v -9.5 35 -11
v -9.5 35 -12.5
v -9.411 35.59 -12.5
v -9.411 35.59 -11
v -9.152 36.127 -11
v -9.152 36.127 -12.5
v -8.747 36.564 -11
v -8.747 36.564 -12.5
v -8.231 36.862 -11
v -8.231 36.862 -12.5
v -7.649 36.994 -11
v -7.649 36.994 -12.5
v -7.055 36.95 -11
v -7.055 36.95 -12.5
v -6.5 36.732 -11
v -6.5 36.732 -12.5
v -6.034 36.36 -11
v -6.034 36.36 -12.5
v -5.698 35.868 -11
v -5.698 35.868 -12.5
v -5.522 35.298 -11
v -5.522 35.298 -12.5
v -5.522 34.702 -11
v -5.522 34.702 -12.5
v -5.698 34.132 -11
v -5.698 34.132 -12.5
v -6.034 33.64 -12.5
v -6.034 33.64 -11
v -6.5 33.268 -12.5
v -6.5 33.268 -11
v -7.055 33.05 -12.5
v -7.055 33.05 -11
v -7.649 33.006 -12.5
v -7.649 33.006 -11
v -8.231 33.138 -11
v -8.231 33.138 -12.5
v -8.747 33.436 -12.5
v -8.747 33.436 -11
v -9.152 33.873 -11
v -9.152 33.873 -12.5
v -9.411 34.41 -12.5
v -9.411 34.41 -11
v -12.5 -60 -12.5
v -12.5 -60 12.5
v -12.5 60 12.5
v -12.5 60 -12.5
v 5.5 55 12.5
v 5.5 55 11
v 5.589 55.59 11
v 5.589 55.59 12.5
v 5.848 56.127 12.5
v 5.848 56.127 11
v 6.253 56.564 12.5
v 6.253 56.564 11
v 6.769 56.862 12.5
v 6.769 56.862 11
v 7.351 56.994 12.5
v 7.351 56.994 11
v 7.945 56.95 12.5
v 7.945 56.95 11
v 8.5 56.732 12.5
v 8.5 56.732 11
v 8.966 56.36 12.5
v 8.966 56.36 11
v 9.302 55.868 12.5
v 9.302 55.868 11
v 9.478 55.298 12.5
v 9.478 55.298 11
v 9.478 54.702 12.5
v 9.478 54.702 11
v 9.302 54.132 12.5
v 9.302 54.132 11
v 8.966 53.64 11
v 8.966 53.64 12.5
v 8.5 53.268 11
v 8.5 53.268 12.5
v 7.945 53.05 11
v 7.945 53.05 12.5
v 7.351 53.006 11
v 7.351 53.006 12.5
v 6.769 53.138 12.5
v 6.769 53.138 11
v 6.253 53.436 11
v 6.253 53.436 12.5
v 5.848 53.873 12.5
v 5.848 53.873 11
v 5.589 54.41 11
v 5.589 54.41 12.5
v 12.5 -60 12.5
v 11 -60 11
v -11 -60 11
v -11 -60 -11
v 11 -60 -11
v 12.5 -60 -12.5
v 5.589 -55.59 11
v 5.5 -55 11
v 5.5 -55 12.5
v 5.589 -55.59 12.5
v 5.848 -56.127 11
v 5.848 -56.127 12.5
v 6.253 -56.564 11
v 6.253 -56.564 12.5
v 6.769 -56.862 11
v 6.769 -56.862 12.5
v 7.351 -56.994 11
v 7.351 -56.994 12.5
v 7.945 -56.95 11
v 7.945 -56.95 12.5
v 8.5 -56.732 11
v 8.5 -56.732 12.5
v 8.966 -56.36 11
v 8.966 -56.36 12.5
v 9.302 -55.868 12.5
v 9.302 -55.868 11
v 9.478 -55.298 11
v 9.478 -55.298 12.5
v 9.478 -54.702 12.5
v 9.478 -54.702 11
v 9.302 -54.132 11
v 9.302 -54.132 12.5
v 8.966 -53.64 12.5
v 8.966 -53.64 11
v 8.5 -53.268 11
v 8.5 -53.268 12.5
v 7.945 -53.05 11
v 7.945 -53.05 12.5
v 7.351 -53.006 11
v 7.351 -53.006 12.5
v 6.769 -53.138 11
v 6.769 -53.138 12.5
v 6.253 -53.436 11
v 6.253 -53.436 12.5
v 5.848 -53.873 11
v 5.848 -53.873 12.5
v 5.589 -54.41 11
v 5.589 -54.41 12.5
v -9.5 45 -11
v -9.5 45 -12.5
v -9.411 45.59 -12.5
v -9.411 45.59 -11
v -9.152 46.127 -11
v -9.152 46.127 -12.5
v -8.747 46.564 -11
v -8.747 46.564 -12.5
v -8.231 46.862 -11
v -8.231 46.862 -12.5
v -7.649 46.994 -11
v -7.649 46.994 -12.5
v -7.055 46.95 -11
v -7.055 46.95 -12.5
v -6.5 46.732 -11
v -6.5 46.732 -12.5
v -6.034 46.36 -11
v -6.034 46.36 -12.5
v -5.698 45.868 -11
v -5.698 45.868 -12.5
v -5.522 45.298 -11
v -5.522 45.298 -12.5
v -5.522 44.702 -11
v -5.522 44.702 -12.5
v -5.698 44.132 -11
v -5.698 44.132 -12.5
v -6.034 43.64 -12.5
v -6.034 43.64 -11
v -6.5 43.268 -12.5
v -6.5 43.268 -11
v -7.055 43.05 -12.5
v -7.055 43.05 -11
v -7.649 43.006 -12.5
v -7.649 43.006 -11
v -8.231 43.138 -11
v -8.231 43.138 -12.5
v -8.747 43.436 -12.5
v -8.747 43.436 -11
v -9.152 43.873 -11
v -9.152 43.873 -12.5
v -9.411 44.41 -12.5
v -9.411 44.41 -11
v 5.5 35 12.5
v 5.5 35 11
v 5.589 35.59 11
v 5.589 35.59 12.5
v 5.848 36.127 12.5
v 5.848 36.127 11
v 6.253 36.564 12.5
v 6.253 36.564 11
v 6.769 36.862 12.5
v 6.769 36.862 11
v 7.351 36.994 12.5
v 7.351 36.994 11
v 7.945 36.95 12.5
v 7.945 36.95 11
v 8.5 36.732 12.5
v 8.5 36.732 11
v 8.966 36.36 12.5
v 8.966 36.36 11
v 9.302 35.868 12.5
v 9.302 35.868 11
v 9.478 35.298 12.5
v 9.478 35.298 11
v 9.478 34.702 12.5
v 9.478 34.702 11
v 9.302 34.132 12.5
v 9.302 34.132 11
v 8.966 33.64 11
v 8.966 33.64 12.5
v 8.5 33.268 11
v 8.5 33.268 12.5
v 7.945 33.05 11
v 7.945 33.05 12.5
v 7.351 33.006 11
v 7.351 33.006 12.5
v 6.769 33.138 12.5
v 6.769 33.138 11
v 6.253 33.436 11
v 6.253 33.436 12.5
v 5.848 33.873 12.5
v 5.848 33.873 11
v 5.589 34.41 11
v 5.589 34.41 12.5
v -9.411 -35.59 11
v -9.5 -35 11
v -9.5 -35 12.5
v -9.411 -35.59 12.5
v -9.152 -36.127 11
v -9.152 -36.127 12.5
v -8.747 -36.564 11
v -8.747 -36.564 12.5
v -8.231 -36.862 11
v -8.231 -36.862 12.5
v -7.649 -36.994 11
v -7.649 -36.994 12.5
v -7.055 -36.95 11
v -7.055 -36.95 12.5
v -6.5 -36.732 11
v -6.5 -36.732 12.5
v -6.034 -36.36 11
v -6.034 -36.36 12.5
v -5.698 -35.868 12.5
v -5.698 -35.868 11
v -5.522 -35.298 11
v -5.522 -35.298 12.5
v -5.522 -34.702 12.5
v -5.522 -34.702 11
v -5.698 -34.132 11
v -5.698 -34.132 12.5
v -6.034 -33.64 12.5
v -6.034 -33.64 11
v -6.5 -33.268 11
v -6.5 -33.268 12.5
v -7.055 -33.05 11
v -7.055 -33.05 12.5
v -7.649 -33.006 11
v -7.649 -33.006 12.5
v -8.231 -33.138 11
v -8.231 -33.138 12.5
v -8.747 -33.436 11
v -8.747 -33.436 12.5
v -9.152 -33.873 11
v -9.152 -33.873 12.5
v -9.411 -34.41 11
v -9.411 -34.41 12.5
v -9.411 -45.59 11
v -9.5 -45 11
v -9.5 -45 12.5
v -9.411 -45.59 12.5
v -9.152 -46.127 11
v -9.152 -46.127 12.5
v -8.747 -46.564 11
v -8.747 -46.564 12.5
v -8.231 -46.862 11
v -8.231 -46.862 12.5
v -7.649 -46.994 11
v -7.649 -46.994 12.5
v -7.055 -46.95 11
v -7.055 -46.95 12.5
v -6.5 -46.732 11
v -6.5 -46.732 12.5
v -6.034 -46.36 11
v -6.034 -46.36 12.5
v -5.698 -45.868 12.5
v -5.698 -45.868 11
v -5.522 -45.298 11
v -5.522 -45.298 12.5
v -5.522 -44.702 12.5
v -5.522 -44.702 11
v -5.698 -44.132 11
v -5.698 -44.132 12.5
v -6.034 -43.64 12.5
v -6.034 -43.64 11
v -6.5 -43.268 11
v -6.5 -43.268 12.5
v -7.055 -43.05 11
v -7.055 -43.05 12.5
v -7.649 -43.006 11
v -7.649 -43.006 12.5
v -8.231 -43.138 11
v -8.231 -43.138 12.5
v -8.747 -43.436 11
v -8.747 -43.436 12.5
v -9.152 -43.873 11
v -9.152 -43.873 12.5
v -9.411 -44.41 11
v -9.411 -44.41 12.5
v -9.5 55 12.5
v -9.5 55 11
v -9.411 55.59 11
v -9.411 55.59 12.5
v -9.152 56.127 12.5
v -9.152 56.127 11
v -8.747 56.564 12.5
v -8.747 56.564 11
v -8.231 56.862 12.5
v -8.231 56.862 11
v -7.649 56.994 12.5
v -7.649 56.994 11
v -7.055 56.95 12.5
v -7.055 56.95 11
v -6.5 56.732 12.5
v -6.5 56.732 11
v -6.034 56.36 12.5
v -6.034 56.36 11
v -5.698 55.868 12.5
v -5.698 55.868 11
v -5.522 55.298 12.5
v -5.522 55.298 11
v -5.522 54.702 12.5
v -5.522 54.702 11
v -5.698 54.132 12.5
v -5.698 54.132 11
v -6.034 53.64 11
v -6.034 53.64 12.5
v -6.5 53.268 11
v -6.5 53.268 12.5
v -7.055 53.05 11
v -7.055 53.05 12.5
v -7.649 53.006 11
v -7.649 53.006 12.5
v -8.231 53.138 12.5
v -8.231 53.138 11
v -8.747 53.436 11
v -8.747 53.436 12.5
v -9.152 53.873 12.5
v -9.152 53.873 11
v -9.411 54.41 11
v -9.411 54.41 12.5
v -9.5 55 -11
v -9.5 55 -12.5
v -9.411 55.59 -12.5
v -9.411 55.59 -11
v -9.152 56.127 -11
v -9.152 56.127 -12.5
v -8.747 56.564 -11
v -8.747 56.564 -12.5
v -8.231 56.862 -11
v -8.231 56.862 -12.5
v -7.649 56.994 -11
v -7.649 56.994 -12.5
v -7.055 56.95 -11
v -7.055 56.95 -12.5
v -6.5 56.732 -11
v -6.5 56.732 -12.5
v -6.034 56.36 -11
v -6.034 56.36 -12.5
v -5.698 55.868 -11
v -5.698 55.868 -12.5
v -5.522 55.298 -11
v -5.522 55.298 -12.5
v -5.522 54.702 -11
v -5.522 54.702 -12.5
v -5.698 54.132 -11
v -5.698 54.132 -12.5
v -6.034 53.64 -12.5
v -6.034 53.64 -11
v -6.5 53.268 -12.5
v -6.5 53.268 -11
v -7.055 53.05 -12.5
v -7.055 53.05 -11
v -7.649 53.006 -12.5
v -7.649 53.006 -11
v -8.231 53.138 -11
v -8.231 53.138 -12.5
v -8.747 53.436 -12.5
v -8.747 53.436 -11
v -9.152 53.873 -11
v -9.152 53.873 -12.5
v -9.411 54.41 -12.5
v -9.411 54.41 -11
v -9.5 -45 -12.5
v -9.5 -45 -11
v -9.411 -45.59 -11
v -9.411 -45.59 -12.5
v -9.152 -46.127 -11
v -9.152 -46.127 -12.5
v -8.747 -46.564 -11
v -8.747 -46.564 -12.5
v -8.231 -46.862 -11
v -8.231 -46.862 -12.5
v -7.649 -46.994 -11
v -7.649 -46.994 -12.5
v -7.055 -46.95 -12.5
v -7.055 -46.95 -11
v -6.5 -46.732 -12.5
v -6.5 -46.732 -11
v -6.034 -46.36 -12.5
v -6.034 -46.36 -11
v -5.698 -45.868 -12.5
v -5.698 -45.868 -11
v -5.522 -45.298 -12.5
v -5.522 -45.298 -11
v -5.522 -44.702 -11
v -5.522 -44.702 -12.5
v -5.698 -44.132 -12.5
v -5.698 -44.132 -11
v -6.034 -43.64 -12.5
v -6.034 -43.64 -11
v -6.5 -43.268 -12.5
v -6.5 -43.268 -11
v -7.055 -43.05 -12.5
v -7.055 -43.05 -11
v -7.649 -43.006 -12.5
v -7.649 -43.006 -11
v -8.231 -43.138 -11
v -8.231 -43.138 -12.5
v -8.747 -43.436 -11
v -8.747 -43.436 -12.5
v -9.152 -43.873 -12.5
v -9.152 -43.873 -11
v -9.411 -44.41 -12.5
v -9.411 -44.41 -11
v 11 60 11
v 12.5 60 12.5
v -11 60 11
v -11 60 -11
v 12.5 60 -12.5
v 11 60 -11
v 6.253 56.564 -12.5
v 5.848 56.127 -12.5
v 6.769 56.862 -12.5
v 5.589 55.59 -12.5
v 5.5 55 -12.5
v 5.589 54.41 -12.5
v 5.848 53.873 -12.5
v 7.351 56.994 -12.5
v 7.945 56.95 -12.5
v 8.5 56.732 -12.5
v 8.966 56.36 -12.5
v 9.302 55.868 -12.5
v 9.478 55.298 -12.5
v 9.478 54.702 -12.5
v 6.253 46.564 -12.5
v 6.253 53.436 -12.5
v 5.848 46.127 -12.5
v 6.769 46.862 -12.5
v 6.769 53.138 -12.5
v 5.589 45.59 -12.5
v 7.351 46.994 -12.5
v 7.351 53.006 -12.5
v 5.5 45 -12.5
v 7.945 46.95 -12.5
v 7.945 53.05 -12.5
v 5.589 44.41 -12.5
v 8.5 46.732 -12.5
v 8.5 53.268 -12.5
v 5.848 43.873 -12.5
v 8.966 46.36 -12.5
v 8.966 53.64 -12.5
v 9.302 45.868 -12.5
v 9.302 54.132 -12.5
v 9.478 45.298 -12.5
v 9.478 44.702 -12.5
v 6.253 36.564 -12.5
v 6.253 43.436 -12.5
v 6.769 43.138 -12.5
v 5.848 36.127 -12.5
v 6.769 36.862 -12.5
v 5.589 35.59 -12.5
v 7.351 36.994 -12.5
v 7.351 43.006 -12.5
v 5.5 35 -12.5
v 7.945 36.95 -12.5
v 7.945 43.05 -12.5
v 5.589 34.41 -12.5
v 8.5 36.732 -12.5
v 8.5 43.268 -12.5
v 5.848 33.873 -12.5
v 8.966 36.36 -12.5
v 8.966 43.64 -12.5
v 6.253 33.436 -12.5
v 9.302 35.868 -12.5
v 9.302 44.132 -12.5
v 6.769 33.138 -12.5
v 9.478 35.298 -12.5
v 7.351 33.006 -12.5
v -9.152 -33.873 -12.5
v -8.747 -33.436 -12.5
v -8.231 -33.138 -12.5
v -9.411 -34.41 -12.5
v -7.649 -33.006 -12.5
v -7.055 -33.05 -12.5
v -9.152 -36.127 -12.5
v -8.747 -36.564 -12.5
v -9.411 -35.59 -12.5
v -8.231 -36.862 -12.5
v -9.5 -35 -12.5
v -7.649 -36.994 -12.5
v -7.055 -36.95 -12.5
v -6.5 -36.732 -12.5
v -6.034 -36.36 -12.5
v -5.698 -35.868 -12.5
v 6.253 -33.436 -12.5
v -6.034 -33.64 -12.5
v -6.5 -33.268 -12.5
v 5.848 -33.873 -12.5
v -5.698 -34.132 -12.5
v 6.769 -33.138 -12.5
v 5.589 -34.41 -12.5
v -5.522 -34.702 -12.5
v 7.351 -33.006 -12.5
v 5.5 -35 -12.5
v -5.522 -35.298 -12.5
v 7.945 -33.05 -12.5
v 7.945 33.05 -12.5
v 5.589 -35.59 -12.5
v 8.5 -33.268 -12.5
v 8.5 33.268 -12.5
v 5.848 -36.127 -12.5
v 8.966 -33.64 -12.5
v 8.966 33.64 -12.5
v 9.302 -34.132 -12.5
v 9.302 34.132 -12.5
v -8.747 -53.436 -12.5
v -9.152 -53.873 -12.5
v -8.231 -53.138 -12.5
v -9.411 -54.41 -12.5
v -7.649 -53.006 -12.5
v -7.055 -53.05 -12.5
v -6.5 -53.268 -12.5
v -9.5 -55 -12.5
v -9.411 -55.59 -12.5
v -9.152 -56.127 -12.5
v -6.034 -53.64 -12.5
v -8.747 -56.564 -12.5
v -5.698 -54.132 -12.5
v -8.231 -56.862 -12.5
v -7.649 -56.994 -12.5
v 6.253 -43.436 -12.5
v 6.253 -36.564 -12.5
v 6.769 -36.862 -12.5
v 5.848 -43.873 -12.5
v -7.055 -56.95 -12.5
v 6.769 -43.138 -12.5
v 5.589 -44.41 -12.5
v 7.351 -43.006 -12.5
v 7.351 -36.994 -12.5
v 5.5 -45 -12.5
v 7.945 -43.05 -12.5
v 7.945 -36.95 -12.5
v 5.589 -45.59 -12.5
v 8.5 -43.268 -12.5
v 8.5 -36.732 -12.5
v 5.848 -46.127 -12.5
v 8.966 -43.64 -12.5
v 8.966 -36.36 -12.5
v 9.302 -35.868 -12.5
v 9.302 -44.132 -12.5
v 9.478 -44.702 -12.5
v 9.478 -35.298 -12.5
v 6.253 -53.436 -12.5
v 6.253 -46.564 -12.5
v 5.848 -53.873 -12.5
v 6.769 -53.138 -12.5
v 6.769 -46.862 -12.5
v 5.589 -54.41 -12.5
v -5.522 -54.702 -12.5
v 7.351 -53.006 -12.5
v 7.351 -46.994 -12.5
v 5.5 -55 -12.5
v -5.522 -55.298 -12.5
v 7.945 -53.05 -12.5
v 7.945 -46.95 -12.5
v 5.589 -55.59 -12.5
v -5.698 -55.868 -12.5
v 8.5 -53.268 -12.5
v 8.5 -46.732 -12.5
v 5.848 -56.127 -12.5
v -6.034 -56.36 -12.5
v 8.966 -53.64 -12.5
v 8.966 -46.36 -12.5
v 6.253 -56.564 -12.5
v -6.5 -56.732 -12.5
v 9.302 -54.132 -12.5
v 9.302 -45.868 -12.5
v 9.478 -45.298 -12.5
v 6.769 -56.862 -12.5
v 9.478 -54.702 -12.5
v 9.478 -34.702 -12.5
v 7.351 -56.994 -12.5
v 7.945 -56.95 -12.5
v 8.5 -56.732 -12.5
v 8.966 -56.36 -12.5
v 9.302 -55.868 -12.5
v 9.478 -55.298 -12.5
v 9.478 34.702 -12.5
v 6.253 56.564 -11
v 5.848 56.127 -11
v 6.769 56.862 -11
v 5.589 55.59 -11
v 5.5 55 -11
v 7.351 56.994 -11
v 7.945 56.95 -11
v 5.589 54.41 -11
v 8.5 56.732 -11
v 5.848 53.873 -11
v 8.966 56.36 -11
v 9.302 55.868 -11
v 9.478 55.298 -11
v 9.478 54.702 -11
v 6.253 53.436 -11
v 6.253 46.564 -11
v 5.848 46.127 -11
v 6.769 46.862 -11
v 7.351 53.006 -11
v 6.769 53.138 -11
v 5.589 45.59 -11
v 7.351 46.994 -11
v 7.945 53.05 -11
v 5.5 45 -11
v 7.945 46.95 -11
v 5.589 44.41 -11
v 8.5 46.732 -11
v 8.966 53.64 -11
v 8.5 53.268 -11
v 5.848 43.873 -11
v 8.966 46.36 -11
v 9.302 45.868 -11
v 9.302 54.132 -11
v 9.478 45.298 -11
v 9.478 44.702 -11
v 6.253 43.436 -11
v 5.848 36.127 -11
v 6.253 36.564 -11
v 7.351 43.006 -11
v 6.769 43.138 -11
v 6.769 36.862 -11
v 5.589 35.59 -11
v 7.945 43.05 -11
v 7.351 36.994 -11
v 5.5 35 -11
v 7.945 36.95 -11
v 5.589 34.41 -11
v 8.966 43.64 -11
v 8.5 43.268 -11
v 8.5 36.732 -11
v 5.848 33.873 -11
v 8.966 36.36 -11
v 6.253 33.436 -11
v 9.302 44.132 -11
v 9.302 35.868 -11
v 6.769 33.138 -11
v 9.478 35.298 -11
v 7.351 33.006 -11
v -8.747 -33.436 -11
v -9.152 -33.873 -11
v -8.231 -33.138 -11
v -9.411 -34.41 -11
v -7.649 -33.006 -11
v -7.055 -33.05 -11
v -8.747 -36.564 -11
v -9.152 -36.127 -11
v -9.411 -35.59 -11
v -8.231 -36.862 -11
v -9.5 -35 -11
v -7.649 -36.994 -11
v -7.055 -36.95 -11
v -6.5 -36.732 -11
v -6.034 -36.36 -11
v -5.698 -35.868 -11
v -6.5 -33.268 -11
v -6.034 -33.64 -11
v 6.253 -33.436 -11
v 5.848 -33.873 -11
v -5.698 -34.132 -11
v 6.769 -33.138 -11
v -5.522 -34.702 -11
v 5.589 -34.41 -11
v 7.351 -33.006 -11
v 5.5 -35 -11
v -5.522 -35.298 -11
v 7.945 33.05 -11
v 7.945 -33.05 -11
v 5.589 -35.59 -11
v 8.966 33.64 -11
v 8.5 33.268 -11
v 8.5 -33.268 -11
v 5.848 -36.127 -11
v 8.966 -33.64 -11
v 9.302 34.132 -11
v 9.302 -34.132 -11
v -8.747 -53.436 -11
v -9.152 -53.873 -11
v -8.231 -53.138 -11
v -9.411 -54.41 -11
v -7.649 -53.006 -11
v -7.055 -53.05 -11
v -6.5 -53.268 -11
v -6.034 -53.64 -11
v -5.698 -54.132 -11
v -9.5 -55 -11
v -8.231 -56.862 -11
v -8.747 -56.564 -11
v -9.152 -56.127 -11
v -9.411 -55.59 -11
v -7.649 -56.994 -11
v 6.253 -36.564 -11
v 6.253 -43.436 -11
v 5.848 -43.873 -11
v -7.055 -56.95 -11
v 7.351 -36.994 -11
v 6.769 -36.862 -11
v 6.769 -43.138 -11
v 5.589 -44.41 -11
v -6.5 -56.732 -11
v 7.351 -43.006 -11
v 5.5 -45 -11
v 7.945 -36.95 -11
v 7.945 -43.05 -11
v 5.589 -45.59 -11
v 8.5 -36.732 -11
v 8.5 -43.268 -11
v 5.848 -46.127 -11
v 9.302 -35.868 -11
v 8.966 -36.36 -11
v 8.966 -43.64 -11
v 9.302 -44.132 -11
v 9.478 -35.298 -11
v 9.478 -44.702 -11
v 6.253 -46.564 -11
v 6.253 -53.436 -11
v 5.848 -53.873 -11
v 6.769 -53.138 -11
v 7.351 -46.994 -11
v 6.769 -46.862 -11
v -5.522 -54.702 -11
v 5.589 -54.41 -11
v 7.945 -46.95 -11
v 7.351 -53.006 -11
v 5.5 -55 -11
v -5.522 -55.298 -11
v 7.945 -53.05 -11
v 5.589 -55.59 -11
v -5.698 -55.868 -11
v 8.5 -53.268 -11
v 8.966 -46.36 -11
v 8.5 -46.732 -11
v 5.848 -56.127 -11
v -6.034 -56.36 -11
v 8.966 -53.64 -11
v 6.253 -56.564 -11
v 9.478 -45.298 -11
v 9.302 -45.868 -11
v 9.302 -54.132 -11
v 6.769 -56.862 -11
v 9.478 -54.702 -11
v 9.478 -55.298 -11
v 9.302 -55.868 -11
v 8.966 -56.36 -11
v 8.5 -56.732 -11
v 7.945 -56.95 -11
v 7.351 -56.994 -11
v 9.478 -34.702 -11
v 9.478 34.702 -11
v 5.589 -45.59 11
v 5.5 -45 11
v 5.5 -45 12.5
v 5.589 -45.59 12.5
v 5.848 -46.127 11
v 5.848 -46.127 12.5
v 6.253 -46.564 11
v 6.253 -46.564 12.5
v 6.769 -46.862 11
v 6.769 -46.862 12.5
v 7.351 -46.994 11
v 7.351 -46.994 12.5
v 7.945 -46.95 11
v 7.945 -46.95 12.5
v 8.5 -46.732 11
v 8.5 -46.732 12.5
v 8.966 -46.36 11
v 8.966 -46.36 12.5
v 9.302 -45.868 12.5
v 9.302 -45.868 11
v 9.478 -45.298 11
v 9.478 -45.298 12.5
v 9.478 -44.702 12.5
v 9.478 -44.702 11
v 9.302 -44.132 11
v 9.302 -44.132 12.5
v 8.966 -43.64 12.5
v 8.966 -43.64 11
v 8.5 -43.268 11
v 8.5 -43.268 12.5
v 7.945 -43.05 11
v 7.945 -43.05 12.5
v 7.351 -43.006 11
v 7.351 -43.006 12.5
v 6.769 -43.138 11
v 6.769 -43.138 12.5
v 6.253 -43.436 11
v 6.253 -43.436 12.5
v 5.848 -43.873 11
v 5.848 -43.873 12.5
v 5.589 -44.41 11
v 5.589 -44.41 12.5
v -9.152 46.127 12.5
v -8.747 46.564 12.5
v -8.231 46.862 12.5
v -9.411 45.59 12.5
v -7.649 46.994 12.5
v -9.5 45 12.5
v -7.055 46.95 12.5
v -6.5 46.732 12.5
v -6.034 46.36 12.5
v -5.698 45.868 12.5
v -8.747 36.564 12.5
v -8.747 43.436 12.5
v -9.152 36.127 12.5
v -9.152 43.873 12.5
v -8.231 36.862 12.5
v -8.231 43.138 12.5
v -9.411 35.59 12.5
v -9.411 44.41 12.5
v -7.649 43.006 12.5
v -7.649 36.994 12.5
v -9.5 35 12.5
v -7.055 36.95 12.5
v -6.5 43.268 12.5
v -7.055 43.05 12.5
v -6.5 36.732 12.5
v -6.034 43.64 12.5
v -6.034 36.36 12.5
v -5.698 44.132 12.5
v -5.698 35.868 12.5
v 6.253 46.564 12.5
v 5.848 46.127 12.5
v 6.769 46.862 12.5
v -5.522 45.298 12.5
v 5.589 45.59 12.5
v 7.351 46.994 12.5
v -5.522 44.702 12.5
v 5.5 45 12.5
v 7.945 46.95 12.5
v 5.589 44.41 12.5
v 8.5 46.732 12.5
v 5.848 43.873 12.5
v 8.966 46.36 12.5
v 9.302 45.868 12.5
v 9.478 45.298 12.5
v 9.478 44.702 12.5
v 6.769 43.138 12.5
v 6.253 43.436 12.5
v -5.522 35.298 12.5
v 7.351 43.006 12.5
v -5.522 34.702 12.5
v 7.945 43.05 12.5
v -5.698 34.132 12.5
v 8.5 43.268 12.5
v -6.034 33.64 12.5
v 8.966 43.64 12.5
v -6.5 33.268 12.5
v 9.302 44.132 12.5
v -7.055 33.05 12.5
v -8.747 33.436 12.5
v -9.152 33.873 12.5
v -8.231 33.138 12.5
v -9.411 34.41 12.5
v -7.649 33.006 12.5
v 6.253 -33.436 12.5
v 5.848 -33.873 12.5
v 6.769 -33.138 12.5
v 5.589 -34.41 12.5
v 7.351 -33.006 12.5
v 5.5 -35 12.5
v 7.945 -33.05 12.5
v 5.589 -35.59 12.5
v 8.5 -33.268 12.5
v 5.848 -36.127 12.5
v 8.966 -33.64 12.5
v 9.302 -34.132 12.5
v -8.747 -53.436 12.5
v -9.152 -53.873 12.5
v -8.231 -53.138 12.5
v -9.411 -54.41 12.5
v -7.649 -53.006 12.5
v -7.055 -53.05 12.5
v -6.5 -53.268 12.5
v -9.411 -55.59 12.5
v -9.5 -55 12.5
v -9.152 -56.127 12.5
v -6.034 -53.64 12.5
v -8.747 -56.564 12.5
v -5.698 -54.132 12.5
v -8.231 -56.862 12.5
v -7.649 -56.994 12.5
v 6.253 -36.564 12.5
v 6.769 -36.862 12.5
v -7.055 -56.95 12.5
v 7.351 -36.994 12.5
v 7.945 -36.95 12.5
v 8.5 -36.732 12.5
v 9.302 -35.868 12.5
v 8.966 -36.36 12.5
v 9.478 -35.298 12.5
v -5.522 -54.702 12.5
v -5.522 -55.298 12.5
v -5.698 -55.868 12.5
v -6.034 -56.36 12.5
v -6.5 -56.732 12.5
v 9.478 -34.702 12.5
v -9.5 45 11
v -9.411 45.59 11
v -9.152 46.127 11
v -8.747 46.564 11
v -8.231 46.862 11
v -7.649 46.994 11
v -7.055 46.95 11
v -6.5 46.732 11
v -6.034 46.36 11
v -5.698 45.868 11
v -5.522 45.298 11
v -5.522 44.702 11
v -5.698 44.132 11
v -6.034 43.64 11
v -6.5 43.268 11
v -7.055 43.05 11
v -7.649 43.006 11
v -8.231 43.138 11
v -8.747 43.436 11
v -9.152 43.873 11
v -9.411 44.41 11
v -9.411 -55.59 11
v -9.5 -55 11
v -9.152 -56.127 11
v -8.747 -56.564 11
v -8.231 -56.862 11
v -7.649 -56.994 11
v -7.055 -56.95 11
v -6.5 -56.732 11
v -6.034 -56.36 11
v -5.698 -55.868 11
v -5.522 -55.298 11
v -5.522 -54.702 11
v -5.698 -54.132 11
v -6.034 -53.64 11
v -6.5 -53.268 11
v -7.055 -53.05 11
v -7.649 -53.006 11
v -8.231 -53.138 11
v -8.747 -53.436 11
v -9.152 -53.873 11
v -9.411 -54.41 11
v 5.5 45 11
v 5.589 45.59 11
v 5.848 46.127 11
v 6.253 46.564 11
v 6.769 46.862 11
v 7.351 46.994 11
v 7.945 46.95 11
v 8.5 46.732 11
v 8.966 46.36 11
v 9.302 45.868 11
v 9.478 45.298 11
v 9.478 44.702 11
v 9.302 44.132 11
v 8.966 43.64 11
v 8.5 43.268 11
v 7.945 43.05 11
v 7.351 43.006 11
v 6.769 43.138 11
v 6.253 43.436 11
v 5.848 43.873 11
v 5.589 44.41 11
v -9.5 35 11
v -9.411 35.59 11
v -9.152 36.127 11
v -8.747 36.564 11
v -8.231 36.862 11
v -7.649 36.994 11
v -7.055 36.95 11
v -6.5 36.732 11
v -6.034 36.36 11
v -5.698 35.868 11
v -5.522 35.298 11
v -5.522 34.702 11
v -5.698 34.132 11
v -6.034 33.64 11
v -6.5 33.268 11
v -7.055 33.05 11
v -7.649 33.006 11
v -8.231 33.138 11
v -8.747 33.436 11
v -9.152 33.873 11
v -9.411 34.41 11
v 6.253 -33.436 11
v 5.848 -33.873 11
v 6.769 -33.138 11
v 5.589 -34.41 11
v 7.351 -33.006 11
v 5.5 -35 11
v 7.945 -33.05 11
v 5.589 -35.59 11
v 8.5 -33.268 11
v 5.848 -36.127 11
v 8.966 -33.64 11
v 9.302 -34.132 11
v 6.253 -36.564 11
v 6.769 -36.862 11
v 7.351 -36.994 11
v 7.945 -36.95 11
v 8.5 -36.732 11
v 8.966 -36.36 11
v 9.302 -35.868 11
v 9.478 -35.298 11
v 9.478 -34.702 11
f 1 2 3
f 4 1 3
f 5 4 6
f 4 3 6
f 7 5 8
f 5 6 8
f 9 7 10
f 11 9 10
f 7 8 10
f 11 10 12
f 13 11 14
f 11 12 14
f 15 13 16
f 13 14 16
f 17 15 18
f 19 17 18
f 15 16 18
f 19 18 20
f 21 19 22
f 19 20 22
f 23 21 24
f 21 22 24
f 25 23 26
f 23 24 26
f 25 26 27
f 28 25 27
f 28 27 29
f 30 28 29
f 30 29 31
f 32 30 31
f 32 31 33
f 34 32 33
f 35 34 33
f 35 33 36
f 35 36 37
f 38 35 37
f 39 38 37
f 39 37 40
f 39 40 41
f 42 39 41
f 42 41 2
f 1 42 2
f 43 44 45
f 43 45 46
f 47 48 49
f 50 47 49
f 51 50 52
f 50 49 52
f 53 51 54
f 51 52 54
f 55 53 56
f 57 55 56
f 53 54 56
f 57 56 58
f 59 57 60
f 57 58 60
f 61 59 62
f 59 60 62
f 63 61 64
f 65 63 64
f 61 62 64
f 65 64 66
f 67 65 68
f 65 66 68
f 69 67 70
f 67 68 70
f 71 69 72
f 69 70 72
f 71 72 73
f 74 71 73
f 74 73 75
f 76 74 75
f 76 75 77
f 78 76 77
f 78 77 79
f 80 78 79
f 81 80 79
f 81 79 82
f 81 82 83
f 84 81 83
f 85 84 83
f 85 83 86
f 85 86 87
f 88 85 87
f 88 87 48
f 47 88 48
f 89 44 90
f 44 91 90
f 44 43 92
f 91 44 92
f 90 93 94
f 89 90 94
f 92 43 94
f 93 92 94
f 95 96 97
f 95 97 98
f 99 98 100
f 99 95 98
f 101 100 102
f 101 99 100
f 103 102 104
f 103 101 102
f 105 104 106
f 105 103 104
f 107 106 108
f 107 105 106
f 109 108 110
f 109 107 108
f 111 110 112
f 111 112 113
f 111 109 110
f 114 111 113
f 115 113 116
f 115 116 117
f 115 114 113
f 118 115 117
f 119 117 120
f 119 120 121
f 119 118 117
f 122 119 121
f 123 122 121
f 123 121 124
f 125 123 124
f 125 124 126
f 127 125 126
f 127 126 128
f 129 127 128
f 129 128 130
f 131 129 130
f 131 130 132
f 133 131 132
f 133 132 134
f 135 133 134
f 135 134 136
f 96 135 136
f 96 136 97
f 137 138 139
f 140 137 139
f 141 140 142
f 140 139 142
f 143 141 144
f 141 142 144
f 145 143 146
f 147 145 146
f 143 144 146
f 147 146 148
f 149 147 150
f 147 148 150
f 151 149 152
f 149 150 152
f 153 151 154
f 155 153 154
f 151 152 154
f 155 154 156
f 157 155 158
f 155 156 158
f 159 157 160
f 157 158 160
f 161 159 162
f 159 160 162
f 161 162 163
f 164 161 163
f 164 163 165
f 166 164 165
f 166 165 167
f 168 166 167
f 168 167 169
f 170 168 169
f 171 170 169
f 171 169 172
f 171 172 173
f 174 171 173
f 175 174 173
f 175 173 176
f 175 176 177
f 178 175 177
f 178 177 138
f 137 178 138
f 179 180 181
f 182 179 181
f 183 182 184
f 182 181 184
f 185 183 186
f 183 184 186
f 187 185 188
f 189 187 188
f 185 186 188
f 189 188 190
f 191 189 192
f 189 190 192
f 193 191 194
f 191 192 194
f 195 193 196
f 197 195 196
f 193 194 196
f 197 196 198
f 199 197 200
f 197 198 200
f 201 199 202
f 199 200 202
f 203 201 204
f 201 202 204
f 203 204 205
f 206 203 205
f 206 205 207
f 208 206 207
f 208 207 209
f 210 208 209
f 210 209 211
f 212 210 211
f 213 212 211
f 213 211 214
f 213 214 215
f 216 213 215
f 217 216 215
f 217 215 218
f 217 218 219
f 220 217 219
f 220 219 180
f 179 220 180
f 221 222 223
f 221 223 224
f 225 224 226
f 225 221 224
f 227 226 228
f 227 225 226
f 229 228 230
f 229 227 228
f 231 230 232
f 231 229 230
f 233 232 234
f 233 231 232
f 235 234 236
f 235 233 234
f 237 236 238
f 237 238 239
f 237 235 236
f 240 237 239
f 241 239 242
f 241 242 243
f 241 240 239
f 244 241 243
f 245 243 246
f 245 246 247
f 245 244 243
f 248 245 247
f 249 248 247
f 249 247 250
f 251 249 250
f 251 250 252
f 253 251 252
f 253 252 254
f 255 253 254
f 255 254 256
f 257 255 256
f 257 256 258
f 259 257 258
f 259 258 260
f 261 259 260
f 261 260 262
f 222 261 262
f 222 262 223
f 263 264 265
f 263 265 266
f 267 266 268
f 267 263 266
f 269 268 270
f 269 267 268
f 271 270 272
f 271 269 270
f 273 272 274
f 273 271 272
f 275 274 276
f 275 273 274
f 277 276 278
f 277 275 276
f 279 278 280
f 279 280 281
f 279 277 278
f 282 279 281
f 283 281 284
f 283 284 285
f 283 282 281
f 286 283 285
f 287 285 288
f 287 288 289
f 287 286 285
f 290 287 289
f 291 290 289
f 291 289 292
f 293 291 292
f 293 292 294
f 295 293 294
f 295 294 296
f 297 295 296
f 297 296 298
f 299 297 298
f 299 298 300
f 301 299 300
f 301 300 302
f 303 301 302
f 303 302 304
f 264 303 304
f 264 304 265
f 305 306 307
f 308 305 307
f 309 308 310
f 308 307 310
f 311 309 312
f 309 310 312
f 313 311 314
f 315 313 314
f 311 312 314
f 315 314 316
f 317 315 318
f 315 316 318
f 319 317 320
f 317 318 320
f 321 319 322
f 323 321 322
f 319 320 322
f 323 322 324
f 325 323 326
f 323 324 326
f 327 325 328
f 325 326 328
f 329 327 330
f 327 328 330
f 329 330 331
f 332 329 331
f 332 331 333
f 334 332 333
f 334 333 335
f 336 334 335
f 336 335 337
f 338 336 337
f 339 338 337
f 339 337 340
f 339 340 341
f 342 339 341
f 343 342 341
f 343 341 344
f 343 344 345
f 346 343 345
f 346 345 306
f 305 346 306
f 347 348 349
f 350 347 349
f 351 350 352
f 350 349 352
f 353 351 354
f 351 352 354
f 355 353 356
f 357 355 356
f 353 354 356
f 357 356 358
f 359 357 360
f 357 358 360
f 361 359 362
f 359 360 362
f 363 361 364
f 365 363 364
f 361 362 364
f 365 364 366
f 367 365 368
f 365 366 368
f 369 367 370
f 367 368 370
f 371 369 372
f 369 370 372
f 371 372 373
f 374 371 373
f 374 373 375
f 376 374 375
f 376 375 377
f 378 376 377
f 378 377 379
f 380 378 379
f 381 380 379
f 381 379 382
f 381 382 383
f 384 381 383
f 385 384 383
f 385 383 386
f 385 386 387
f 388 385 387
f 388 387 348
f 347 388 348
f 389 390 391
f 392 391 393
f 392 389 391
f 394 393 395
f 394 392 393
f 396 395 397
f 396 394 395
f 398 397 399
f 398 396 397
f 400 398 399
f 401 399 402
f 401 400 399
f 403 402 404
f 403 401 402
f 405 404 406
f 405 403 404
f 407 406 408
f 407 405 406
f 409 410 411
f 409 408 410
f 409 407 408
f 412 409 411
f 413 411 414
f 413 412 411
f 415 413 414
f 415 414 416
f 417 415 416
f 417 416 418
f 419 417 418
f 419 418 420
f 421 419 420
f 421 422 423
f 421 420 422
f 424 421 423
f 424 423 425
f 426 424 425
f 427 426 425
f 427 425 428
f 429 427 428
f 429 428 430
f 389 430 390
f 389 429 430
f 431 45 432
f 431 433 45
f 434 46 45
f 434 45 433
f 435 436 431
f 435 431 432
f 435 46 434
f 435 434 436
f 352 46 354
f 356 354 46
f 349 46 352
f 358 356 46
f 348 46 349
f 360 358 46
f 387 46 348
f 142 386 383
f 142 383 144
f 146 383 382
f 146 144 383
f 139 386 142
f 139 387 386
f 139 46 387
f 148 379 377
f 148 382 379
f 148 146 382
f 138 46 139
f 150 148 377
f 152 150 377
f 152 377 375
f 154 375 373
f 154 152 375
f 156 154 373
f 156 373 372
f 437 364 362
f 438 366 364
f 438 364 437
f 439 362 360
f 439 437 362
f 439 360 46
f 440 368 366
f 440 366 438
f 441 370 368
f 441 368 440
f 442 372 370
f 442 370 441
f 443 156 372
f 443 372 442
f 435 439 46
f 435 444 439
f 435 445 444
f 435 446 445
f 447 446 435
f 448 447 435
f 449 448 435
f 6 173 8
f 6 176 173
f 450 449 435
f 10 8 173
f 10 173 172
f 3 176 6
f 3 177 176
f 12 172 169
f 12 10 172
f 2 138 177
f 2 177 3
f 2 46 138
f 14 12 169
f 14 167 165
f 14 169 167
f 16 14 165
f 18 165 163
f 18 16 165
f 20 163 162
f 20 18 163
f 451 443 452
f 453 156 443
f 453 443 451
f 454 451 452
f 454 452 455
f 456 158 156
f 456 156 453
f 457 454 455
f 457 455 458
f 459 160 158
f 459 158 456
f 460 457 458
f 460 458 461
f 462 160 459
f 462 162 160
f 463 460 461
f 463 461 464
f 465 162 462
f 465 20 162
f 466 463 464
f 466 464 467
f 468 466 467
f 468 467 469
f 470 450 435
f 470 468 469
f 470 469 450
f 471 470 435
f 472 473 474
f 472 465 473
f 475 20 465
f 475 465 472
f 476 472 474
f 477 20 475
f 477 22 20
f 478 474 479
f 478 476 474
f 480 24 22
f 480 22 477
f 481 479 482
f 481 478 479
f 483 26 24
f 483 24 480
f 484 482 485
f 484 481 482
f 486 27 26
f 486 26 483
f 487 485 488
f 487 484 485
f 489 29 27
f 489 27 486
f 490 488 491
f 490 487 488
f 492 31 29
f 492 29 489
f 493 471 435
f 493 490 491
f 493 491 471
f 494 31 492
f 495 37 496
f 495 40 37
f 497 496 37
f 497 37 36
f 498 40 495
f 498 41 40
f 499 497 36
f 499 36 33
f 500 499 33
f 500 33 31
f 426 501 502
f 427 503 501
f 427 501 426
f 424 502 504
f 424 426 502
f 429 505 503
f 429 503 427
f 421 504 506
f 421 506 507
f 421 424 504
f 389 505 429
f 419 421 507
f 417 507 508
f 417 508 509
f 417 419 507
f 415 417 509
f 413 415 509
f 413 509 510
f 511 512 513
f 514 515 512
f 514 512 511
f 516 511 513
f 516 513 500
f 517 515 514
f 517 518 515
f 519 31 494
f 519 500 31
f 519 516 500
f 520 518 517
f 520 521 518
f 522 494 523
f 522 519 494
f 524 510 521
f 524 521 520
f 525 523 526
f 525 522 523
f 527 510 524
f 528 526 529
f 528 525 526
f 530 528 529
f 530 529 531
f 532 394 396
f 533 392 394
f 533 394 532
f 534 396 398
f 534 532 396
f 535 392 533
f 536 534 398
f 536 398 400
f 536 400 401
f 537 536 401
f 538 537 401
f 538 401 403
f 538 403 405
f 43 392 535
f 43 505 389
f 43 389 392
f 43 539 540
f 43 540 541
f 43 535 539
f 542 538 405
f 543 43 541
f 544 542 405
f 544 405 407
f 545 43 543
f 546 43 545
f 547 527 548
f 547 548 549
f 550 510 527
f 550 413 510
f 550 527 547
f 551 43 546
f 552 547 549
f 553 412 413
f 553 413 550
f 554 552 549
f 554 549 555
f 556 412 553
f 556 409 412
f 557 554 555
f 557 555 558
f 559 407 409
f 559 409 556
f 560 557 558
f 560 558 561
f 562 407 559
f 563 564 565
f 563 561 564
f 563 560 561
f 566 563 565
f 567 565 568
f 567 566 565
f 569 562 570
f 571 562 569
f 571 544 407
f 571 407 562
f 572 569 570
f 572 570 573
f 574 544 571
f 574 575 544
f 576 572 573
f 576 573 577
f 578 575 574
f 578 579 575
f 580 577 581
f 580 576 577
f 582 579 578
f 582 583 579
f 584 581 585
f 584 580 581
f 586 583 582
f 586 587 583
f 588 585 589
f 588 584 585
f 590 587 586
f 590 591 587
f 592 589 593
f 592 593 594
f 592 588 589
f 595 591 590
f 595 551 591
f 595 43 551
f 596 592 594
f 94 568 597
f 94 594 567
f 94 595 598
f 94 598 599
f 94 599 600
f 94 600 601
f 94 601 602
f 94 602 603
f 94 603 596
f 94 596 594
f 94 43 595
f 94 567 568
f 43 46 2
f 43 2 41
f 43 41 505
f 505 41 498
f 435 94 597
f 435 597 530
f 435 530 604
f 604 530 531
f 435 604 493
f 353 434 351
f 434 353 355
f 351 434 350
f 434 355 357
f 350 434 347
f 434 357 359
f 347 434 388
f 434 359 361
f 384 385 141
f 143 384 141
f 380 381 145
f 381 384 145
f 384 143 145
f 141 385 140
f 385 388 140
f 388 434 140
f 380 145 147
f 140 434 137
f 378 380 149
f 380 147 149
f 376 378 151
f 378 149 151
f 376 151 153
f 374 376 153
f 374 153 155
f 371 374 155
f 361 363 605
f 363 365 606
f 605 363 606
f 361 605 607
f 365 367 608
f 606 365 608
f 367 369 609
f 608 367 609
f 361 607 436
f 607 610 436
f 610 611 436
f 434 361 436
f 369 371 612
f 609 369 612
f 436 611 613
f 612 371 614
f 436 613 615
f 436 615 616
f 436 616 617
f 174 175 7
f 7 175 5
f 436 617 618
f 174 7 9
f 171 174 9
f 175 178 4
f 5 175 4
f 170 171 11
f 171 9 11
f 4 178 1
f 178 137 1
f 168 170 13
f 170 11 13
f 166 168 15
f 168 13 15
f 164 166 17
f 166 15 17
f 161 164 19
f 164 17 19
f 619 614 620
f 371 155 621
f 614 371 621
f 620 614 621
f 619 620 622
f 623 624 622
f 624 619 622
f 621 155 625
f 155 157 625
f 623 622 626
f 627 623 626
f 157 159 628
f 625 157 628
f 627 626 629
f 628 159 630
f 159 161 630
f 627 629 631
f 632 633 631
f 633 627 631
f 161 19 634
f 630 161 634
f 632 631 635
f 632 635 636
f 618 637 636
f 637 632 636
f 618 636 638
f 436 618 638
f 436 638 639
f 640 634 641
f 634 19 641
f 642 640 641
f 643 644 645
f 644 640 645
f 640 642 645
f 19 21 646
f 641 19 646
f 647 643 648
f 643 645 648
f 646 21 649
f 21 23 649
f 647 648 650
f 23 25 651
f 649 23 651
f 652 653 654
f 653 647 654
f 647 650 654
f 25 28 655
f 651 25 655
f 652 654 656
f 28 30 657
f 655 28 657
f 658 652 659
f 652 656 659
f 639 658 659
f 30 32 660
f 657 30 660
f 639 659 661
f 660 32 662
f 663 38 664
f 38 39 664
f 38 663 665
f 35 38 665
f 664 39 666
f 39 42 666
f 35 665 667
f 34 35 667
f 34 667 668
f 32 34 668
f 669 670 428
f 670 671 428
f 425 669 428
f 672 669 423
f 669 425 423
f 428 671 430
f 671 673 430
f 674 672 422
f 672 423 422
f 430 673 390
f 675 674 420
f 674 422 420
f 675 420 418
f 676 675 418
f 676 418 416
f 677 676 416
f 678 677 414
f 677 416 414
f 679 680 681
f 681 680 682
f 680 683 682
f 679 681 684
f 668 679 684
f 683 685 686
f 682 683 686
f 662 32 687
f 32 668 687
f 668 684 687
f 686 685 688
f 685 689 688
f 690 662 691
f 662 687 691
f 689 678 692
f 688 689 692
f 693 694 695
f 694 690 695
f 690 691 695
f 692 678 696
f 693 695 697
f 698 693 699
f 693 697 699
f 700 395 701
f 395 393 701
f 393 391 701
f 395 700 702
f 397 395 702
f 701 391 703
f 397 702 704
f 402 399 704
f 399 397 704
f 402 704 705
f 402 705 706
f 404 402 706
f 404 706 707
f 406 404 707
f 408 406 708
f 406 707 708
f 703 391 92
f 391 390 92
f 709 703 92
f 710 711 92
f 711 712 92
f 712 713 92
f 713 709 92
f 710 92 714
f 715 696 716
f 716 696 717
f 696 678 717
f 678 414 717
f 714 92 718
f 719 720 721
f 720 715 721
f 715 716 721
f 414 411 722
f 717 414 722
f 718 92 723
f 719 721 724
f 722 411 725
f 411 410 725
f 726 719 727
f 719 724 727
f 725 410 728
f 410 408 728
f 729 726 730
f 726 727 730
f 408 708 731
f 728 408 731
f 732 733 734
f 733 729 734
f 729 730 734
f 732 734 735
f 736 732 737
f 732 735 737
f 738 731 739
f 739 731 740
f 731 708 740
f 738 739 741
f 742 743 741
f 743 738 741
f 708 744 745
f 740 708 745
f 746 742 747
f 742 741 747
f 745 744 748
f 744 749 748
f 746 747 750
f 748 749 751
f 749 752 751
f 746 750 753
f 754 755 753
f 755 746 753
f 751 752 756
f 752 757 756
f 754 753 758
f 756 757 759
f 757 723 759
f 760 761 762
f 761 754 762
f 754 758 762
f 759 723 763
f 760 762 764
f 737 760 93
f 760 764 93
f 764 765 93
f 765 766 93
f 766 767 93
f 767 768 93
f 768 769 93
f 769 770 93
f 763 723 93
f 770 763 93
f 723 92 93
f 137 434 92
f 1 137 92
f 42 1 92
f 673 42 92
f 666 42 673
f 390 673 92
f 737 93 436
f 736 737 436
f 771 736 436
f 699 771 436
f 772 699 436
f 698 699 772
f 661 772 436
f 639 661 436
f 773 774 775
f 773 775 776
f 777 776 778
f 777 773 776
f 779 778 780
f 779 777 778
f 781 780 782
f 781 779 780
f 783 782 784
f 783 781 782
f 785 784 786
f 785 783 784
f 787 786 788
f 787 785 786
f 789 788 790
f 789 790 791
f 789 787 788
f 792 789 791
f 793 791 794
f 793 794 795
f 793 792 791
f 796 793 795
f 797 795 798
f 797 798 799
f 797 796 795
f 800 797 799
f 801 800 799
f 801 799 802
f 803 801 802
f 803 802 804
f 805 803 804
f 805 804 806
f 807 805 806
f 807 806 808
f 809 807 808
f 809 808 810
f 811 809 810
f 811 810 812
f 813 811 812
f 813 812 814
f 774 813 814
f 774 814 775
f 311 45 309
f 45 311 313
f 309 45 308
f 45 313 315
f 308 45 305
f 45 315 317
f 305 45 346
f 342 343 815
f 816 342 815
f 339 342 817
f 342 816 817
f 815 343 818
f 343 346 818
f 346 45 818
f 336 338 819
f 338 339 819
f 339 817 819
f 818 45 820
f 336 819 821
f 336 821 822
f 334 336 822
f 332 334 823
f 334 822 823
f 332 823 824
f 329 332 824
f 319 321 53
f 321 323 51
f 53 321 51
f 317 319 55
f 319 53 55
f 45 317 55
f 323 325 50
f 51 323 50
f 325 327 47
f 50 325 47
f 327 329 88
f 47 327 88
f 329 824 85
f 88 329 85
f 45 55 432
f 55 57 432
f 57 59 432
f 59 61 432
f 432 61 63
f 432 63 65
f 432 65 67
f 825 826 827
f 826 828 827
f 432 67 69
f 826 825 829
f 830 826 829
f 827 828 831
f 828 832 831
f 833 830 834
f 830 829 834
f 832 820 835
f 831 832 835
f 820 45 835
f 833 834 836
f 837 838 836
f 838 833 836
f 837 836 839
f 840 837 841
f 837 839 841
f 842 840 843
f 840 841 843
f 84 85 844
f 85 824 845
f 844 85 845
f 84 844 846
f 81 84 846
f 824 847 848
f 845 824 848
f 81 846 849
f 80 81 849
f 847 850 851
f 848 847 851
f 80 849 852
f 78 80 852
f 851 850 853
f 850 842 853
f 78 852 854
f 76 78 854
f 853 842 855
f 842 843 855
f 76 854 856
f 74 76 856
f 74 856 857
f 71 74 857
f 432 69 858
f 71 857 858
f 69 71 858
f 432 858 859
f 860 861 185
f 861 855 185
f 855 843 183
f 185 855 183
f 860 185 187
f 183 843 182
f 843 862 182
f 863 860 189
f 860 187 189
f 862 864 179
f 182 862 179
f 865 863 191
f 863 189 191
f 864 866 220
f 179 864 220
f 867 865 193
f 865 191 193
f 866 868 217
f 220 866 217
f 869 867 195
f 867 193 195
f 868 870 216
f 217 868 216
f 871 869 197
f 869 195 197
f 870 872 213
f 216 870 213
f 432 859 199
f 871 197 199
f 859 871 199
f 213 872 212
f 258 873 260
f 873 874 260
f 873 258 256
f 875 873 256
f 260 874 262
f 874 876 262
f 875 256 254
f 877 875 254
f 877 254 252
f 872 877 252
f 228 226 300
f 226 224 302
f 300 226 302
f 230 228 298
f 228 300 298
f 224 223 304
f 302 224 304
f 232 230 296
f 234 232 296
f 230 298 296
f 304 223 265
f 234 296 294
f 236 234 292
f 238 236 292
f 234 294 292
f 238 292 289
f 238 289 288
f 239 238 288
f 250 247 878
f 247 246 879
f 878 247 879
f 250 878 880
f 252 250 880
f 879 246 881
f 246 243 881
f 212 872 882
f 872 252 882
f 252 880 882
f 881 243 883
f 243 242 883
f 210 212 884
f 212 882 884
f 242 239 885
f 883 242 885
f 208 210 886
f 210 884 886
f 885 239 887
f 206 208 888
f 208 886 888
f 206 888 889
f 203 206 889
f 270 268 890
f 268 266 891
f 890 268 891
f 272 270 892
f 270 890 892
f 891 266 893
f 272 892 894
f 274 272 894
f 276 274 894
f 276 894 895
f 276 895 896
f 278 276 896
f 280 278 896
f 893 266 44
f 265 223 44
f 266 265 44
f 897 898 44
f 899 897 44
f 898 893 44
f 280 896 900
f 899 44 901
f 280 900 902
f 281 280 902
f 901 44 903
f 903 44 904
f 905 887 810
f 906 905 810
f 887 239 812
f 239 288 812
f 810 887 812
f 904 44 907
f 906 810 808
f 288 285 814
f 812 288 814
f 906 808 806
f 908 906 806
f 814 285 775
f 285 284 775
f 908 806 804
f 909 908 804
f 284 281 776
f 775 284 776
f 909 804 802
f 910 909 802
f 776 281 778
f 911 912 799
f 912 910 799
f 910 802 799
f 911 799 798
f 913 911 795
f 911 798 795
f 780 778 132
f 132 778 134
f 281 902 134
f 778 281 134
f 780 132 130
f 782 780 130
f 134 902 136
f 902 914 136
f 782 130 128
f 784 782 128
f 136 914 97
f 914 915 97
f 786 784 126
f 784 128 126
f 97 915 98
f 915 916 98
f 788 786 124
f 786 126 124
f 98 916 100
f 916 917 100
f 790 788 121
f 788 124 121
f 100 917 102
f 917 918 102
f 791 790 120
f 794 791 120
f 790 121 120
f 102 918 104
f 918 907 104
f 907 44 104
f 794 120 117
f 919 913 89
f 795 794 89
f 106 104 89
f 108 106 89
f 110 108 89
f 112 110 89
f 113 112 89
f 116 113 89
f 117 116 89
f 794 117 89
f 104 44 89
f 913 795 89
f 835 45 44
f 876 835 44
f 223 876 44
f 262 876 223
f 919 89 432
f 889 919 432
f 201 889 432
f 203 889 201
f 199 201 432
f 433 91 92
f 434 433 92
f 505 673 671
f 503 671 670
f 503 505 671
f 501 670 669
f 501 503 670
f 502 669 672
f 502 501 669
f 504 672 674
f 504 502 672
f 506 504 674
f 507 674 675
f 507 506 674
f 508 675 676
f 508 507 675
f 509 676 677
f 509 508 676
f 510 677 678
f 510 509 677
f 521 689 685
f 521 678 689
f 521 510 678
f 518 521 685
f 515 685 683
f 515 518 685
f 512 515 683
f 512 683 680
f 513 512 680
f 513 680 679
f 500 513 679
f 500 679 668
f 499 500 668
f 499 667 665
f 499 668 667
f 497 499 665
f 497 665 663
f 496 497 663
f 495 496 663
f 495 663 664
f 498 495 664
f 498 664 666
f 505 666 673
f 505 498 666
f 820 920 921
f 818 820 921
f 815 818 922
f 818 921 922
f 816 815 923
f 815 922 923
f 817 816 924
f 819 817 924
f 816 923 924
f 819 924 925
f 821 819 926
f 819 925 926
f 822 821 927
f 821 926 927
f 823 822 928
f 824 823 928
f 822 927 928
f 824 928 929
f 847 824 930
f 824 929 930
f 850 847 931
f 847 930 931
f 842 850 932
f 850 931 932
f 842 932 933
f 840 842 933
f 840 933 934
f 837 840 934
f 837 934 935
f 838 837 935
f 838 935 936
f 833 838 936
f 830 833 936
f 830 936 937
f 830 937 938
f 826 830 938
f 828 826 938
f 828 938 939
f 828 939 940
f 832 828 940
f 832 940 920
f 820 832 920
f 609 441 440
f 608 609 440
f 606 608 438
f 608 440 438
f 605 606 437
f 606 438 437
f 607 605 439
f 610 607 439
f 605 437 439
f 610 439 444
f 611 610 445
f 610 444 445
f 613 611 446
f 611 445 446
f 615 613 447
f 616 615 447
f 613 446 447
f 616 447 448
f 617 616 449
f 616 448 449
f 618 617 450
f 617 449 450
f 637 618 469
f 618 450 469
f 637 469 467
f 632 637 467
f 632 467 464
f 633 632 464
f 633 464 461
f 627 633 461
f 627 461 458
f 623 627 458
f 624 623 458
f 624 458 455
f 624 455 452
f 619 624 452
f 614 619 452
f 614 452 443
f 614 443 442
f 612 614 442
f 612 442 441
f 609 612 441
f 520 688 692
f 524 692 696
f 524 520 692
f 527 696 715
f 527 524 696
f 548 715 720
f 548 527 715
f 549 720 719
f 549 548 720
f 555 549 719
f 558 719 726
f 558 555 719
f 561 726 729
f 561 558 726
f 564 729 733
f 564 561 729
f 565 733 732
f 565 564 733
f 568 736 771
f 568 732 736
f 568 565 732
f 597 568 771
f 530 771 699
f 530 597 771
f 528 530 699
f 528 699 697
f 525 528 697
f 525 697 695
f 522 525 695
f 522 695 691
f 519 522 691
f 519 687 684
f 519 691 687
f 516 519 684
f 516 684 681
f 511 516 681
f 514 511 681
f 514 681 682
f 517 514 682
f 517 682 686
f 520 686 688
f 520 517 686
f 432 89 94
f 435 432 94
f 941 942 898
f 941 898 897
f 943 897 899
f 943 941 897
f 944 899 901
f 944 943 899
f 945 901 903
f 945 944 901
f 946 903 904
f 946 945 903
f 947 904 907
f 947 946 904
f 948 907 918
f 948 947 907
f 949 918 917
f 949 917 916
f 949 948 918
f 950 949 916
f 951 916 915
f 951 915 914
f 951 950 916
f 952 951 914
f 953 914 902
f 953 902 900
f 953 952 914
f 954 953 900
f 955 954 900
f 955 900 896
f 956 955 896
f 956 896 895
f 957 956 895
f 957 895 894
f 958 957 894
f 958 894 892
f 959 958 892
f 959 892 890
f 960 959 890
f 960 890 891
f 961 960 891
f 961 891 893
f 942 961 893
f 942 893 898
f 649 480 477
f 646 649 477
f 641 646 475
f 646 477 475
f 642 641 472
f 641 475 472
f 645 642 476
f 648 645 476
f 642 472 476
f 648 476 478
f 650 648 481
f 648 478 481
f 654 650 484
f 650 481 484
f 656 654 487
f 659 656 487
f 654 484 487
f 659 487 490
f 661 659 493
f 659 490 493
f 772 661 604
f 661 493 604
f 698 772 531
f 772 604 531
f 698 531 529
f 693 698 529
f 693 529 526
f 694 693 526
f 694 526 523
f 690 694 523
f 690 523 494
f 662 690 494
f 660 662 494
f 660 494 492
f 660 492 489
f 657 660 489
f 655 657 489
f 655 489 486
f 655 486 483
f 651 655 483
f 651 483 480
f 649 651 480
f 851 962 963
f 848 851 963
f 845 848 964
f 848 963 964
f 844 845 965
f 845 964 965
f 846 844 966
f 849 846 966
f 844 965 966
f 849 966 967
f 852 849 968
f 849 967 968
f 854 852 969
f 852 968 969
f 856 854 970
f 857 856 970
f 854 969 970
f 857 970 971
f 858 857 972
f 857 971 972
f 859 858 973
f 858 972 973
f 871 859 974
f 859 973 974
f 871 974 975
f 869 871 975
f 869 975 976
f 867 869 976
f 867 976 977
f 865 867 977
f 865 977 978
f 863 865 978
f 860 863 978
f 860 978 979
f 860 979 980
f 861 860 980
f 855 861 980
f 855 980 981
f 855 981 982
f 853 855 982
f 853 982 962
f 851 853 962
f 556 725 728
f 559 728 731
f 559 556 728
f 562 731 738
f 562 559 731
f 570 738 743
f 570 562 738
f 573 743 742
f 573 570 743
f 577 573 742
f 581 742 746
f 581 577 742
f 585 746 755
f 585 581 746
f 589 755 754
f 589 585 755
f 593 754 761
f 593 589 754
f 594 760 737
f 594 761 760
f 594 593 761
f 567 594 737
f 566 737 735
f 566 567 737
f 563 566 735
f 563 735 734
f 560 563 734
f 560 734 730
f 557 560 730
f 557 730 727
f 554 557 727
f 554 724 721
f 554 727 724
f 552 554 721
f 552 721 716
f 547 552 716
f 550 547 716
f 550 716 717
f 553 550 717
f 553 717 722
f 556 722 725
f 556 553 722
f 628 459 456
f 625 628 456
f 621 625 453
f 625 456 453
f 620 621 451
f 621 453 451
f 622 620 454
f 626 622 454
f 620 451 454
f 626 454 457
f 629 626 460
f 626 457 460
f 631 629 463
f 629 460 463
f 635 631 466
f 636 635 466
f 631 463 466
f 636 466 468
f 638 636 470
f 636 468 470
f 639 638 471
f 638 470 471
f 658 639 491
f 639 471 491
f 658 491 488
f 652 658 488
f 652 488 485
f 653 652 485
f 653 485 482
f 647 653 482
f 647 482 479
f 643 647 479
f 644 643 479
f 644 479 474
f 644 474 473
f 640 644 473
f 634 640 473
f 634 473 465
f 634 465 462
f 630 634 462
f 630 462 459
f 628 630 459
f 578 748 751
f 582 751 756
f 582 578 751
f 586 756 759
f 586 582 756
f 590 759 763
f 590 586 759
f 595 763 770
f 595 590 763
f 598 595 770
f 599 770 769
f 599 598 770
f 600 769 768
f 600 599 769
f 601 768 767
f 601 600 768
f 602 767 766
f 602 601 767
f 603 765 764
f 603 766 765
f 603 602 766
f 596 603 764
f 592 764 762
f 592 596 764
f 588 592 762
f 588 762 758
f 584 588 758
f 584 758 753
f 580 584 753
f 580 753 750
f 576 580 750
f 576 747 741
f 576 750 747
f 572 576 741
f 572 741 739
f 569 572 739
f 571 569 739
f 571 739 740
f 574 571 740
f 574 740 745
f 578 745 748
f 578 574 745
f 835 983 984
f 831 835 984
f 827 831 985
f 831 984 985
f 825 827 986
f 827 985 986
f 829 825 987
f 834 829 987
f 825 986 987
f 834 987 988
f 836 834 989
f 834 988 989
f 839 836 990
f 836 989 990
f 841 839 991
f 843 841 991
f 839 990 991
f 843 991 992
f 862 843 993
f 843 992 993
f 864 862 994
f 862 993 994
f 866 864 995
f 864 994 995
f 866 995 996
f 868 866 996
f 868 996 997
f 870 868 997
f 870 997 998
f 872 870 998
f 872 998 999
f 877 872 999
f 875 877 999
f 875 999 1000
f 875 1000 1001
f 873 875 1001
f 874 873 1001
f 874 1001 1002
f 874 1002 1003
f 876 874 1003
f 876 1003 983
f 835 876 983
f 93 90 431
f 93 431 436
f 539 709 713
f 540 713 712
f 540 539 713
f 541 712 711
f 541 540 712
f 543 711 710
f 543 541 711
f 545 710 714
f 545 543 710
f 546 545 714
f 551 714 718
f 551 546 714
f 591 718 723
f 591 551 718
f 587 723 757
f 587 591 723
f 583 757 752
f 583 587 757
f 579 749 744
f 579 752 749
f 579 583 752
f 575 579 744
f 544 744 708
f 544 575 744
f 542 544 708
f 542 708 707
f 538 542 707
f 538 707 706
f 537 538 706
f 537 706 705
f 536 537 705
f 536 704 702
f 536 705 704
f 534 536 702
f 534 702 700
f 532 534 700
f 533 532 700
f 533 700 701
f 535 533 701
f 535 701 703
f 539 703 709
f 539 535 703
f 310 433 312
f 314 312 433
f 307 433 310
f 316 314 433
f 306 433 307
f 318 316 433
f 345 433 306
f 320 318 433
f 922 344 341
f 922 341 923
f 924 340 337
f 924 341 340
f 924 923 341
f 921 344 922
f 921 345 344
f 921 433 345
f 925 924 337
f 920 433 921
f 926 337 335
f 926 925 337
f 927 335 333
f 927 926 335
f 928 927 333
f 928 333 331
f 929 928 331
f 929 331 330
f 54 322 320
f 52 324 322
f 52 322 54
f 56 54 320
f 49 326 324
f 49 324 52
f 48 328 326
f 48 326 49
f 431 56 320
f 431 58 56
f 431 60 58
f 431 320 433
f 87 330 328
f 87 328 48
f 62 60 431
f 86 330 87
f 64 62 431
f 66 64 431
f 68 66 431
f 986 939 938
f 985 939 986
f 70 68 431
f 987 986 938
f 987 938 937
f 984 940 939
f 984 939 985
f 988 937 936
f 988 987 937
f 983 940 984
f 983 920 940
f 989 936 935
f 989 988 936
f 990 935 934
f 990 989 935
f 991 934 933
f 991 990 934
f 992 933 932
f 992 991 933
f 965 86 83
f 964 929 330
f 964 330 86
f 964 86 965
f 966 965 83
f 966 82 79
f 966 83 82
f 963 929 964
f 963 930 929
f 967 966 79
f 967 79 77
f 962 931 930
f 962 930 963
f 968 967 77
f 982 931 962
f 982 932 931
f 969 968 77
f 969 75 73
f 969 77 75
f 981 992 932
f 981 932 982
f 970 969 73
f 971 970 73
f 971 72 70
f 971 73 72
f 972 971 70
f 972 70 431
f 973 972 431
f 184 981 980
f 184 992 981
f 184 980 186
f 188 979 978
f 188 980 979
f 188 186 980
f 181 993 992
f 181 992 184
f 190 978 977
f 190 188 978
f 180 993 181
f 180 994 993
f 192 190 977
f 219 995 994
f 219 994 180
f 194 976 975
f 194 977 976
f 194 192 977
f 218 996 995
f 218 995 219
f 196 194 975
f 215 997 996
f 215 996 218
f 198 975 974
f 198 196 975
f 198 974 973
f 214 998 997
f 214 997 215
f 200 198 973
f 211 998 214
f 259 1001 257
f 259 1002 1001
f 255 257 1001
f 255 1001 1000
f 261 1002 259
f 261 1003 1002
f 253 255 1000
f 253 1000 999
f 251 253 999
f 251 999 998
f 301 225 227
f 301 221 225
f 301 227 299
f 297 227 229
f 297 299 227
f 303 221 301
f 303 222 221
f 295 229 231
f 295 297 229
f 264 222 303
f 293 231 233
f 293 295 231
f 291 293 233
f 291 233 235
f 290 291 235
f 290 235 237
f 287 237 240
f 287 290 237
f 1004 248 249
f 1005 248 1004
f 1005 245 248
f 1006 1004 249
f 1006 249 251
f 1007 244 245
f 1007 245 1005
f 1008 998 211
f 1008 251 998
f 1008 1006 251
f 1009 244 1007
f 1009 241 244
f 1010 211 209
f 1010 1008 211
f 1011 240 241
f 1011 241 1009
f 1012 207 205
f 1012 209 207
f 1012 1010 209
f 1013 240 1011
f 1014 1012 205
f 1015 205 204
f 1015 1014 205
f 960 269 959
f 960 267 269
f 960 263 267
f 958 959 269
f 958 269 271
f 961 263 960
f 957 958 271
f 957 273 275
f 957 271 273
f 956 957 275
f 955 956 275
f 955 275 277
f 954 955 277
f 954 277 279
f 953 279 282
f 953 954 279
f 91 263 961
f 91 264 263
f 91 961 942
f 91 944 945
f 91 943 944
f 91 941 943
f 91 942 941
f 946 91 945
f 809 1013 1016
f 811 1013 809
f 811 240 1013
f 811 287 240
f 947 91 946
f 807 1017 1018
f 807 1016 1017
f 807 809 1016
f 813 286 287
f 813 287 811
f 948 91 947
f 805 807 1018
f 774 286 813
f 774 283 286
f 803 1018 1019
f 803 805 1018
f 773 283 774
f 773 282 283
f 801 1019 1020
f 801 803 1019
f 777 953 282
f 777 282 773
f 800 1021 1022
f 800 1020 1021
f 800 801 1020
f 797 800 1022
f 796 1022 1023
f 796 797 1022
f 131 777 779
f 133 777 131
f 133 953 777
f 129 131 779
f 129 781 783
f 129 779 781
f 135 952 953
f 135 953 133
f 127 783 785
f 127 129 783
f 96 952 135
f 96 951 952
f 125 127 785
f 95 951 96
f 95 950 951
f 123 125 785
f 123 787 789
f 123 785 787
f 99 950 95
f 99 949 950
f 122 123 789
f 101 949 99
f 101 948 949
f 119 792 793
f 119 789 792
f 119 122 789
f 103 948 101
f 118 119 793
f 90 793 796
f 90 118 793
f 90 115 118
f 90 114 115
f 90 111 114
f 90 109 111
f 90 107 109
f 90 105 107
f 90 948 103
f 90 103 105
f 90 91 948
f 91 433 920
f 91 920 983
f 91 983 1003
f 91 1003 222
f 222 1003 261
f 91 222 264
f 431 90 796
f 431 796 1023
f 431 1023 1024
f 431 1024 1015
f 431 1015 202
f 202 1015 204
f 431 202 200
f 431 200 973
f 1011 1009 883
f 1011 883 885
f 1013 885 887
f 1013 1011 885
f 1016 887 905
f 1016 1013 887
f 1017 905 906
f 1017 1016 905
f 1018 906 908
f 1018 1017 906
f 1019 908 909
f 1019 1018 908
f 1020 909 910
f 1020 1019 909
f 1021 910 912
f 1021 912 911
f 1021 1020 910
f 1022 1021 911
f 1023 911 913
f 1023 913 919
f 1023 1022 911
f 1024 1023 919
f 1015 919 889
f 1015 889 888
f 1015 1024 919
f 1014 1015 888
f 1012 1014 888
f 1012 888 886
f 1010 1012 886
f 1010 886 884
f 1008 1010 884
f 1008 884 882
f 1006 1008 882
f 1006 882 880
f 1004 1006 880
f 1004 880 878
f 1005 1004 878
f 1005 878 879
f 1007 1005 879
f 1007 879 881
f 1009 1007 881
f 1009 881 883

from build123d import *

# Parameters (mm, degrees)
BOSS_EXTRUDE1_DEPTH      = 60
BOSS_EXTRUDE1_DEPTH_BACK = 60
SKETCH1_W                = 25
SKETCH1_H                = 25
SKETCH1_W_2              = 22
SKETCH1_H_2              = 22
SKETCH2_R                = 2
CUT_EXTRUDE1_DEPTH       = 25


with BuildPart() as part:
    # Sketch1 → Boss-Extrude1 (new, two sides: drawn at the far end of the back side and taken through both)
    with BuildSketch(Plane(origin=(0, 0, 0), x_dir=(1, 0, 0), z_dir=(0, 1, 0)).offset(-BOSS_EXTRUDE1_DEPTH_BACK)):
        Rectangle(SKETCH1_W, SKETCH1_H)
        Rectangle(SKETCH1_W_2, SKETCH1_H_2, mode=Mode.SUBTRACT)
    extrude(amount=BOSS_EXTRUDE1_DEPTH + BOSS_EXTRUDE1_DEPTH_BACK)

    # Sketch2 → Cut-Extrude1 (cut)
    with BuildSketch(Plane(origin=(0, 0, -12.5), x_dir=(-1, 0, 0), z_dir=(0, 0, -1))):
        with Locations((7.5, 55)):
            Circle(SKETCH2_R)
        with Locations((7.5, 45)):
            Circle(SKETCH2_R)
        with Locations((-7.5, 55)):
            Circle(SKETCH2_R)
        with Locations((-7.5, 45)):
            Circle(SKETCH2_R)
        with Locations((7.5, 35)):
            Circle(SKETCH2_R)
        with Locations((-7.5, 35)):
            Circle(SKETCH2_R)
    cut_extrude1 = extrude(amount=-CUT_EXTRUDE1_DEPTH, mode=Mode.SUBTRACT)

    # Mirror1: Cut-Extrude1 across plane
    add(cut_extrude1.mirror(Plane.ZX), mode=Mode.SUBTRACT)


solid = part.part
